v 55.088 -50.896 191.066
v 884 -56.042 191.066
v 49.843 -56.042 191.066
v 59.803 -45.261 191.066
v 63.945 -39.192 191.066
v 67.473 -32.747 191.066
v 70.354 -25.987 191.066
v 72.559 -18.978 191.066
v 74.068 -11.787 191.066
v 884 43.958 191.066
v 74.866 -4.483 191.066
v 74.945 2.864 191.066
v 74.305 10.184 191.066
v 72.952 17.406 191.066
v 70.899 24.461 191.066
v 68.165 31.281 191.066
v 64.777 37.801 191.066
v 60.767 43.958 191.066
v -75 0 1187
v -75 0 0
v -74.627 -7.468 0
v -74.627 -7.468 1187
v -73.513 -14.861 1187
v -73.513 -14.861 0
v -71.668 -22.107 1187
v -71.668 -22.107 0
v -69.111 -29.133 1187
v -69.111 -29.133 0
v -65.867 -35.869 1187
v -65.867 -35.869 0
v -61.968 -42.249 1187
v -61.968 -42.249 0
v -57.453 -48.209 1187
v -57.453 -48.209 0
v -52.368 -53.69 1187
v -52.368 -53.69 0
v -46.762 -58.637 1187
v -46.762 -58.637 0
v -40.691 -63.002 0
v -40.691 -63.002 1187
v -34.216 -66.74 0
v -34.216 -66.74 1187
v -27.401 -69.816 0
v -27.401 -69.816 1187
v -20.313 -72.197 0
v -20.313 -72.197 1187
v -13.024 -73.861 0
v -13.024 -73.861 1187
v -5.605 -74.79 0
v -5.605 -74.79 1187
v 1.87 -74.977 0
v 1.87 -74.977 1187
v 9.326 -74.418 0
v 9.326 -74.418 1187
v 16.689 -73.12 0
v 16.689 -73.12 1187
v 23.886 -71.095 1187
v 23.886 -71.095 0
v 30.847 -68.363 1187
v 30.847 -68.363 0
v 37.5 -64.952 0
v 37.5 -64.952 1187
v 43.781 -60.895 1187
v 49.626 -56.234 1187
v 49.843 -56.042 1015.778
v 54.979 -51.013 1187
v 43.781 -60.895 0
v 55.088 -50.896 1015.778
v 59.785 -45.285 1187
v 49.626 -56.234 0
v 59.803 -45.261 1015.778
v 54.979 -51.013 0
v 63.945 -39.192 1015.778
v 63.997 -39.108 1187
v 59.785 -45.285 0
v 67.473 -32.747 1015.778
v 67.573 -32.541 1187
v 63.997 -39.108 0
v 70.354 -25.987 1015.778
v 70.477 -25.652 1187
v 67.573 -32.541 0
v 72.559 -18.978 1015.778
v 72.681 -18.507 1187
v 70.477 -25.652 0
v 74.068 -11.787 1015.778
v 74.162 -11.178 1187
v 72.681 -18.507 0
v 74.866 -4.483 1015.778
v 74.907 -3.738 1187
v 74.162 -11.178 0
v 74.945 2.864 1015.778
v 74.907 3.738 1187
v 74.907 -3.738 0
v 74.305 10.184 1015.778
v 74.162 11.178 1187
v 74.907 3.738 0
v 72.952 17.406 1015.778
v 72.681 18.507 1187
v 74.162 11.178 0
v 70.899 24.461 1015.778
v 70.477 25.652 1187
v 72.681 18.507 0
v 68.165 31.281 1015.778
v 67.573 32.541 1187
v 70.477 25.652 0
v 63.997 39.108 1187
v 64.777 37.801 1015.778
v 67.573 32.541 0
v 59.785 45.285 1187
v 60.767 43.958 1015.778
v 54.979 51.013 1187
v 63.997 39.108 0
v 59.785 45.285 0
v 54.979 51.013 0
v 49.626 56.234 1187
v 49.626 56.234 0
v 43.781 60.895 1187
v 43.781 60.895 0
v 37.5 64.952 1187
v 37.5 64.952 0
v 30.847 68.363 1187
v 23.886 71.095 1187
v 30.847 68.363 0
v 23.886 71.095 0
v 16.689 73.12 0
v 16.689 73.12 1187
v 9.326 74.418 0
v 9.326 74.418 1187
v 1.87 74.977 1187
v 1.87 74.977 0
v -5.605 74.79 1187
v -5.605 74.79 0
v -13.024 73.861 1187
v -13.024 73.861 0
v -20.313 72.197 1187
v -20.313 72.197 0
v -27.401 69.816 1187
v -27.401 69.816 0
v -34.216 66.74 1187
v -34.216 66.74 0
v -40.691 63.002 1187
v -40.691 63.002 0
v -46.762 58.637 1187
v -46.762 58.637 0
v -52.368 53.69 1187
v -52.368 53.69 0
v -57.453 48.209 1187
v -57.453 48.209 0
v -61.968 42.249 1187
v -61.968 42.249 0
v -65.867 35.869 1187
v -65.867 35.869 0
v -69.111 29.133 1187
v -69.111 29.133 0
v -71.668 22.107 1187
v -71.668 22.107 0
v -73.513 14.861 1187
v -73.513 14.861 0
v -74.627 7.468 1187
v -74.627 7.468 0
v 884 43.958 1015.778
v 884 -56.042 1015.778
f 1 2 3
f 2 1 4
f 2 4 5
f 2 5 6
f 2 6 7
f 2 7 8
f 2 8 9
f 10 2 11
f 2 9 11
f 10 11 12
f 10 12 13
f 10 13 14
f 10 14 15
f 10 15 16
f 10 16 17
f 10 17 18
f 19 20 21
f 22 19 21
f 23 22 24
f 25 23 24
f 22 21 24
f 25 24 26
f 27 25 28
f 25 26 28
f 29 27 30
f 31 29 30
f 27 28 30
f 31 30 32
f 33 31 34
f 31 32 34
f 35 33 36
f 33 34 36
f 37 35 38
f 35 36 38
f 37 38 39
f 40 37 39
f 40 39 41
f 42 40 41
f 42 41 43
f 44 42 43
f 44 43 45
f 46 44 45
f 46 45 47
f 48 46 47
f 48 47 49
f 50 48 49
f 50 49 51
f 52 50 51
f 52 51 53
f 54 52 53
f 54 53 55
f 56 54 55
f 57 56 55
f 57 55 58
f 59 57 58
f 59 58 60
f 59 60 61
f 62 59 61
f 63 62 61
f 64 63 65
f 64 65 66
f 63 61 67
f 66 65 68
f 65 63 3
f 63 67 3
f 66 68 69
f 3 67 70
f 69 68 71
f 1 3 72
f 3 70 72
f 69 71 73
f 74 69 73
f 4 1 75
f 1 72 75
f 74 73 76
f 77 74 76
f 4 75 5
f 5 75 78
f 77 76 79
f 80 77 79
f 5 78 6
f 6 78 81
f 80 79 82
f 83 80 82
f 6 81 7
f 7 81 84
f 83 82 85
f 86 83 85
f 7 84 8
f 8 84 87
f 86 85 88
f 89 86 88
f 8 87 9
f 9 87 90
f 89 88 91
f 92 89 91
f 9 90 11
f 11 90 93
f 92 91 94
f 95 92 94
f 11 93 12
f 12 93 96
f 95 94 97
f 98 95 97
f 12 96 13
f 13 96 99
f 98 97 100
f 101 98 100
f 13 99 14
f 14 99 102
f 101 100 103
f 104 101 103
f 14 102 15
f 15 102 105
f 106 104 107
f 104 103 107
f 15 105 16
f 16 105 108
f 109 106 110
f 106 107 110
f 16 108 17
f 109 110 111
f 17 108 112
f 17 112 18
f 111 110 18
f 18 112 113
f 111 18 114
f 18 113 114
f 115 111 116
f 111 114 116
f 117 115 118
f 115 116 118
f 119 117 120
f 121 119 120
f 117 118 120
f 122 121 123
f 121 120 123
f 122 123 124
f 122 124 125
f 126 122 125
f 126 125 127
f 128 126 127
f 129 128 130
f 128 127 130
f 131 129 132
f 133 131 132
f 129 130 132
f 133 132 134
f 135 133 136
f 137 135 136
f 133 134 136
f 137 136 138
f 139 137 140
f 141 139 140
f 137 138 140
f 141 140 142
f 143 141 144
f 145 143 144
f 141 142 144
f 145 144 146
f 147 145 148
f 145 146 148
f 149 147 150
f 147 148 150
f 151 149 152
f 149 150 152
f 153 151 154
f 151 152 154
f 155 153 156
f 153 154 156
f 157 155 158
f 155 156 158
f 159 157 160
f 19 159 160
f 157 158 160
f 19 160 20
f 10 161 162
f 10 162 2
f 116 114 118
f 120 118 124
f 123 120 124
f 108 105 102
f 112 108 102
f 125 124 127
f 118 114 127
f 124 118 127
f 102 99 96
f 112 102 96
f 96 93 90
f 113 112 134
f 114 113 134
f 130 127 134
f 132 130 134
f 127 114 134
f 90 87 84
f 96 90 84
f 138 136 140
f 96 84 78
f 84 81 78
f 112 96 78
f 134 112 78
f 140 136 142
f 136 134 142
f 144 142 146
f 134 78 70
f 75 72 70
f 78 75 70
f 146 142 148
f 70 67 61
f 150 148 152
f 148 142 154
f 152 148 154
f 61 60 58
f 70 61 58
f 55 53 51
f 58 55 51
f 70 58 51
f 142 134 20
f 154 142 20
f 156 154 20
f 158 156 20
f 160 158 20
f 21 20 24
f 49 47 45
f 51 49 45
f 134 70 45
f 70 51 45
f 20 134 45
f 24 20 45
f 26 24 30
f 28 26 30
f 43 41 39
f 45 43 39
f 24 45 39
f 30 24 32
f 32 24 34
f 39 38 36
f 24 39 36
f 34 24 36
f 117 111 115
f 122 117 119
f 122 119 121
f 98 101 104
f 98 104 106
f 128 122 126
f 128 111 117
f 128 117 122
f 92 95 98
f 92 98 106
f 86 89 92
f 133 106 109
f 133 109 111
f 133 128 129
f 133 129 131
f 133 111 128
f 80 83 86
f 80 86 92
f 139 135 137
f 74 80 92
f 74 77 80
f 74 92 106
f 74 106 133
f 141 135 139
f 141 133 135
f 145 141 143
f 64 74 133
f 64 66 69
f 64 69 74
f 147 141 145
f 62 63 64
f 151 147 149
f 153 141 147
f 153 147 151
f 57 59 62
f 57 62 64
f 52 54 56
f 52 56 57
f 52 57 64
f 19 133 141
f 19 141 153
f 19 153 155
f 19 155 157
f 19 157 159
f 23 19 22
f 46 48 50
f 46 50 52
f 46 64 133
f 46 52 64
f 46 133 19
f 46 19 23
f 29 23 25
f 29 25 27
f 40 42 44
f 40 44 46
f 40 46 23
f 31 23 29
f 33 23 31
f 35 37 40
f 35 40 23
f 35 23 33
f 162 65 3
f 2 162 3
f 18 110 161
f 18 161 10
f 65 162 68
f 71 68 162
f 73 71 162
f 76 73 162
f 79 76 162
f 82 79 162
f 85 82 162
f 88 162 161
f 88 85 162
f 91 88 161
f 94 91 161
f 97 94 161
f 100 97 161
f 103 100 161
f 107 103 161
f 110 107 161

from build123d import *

# Parameters (mm, degrees)
SKETCH1_R           = 75
BOSS_EXTRUDE1_DEPTH = 1187
SKETCH3_W           = 824.711862224
SKETCH3_H           = 100
BOSS_EXTRUDE2_DEPTH = 874


with BuildPart() as part:
    # Sketch1 → Boss-Extrude1 (new body)
    with BuildSketch(Plane.XY):
        with Locations(Location((0, 0, 0), (0, 0, 180))):
            Circle(SKETCH1_R)
    extrude(amount=BOSS_EXTRUDE1_DEPTH)

    # Sketch3 → Boss-Extrude2 (add)
    with BuildSketch(Plane(origin=(10, 0, 0), x_dir=(0, 0, -1), z_dir=(1, 0, 0))):
        with Locations((-603.421893573, -6.041666237)):
            Rectangle(SKETCH3_W, SKETCH3_H)
    extrude(amount=BOSS_EXTRUDE2_DEPTH)


solid = part.part
